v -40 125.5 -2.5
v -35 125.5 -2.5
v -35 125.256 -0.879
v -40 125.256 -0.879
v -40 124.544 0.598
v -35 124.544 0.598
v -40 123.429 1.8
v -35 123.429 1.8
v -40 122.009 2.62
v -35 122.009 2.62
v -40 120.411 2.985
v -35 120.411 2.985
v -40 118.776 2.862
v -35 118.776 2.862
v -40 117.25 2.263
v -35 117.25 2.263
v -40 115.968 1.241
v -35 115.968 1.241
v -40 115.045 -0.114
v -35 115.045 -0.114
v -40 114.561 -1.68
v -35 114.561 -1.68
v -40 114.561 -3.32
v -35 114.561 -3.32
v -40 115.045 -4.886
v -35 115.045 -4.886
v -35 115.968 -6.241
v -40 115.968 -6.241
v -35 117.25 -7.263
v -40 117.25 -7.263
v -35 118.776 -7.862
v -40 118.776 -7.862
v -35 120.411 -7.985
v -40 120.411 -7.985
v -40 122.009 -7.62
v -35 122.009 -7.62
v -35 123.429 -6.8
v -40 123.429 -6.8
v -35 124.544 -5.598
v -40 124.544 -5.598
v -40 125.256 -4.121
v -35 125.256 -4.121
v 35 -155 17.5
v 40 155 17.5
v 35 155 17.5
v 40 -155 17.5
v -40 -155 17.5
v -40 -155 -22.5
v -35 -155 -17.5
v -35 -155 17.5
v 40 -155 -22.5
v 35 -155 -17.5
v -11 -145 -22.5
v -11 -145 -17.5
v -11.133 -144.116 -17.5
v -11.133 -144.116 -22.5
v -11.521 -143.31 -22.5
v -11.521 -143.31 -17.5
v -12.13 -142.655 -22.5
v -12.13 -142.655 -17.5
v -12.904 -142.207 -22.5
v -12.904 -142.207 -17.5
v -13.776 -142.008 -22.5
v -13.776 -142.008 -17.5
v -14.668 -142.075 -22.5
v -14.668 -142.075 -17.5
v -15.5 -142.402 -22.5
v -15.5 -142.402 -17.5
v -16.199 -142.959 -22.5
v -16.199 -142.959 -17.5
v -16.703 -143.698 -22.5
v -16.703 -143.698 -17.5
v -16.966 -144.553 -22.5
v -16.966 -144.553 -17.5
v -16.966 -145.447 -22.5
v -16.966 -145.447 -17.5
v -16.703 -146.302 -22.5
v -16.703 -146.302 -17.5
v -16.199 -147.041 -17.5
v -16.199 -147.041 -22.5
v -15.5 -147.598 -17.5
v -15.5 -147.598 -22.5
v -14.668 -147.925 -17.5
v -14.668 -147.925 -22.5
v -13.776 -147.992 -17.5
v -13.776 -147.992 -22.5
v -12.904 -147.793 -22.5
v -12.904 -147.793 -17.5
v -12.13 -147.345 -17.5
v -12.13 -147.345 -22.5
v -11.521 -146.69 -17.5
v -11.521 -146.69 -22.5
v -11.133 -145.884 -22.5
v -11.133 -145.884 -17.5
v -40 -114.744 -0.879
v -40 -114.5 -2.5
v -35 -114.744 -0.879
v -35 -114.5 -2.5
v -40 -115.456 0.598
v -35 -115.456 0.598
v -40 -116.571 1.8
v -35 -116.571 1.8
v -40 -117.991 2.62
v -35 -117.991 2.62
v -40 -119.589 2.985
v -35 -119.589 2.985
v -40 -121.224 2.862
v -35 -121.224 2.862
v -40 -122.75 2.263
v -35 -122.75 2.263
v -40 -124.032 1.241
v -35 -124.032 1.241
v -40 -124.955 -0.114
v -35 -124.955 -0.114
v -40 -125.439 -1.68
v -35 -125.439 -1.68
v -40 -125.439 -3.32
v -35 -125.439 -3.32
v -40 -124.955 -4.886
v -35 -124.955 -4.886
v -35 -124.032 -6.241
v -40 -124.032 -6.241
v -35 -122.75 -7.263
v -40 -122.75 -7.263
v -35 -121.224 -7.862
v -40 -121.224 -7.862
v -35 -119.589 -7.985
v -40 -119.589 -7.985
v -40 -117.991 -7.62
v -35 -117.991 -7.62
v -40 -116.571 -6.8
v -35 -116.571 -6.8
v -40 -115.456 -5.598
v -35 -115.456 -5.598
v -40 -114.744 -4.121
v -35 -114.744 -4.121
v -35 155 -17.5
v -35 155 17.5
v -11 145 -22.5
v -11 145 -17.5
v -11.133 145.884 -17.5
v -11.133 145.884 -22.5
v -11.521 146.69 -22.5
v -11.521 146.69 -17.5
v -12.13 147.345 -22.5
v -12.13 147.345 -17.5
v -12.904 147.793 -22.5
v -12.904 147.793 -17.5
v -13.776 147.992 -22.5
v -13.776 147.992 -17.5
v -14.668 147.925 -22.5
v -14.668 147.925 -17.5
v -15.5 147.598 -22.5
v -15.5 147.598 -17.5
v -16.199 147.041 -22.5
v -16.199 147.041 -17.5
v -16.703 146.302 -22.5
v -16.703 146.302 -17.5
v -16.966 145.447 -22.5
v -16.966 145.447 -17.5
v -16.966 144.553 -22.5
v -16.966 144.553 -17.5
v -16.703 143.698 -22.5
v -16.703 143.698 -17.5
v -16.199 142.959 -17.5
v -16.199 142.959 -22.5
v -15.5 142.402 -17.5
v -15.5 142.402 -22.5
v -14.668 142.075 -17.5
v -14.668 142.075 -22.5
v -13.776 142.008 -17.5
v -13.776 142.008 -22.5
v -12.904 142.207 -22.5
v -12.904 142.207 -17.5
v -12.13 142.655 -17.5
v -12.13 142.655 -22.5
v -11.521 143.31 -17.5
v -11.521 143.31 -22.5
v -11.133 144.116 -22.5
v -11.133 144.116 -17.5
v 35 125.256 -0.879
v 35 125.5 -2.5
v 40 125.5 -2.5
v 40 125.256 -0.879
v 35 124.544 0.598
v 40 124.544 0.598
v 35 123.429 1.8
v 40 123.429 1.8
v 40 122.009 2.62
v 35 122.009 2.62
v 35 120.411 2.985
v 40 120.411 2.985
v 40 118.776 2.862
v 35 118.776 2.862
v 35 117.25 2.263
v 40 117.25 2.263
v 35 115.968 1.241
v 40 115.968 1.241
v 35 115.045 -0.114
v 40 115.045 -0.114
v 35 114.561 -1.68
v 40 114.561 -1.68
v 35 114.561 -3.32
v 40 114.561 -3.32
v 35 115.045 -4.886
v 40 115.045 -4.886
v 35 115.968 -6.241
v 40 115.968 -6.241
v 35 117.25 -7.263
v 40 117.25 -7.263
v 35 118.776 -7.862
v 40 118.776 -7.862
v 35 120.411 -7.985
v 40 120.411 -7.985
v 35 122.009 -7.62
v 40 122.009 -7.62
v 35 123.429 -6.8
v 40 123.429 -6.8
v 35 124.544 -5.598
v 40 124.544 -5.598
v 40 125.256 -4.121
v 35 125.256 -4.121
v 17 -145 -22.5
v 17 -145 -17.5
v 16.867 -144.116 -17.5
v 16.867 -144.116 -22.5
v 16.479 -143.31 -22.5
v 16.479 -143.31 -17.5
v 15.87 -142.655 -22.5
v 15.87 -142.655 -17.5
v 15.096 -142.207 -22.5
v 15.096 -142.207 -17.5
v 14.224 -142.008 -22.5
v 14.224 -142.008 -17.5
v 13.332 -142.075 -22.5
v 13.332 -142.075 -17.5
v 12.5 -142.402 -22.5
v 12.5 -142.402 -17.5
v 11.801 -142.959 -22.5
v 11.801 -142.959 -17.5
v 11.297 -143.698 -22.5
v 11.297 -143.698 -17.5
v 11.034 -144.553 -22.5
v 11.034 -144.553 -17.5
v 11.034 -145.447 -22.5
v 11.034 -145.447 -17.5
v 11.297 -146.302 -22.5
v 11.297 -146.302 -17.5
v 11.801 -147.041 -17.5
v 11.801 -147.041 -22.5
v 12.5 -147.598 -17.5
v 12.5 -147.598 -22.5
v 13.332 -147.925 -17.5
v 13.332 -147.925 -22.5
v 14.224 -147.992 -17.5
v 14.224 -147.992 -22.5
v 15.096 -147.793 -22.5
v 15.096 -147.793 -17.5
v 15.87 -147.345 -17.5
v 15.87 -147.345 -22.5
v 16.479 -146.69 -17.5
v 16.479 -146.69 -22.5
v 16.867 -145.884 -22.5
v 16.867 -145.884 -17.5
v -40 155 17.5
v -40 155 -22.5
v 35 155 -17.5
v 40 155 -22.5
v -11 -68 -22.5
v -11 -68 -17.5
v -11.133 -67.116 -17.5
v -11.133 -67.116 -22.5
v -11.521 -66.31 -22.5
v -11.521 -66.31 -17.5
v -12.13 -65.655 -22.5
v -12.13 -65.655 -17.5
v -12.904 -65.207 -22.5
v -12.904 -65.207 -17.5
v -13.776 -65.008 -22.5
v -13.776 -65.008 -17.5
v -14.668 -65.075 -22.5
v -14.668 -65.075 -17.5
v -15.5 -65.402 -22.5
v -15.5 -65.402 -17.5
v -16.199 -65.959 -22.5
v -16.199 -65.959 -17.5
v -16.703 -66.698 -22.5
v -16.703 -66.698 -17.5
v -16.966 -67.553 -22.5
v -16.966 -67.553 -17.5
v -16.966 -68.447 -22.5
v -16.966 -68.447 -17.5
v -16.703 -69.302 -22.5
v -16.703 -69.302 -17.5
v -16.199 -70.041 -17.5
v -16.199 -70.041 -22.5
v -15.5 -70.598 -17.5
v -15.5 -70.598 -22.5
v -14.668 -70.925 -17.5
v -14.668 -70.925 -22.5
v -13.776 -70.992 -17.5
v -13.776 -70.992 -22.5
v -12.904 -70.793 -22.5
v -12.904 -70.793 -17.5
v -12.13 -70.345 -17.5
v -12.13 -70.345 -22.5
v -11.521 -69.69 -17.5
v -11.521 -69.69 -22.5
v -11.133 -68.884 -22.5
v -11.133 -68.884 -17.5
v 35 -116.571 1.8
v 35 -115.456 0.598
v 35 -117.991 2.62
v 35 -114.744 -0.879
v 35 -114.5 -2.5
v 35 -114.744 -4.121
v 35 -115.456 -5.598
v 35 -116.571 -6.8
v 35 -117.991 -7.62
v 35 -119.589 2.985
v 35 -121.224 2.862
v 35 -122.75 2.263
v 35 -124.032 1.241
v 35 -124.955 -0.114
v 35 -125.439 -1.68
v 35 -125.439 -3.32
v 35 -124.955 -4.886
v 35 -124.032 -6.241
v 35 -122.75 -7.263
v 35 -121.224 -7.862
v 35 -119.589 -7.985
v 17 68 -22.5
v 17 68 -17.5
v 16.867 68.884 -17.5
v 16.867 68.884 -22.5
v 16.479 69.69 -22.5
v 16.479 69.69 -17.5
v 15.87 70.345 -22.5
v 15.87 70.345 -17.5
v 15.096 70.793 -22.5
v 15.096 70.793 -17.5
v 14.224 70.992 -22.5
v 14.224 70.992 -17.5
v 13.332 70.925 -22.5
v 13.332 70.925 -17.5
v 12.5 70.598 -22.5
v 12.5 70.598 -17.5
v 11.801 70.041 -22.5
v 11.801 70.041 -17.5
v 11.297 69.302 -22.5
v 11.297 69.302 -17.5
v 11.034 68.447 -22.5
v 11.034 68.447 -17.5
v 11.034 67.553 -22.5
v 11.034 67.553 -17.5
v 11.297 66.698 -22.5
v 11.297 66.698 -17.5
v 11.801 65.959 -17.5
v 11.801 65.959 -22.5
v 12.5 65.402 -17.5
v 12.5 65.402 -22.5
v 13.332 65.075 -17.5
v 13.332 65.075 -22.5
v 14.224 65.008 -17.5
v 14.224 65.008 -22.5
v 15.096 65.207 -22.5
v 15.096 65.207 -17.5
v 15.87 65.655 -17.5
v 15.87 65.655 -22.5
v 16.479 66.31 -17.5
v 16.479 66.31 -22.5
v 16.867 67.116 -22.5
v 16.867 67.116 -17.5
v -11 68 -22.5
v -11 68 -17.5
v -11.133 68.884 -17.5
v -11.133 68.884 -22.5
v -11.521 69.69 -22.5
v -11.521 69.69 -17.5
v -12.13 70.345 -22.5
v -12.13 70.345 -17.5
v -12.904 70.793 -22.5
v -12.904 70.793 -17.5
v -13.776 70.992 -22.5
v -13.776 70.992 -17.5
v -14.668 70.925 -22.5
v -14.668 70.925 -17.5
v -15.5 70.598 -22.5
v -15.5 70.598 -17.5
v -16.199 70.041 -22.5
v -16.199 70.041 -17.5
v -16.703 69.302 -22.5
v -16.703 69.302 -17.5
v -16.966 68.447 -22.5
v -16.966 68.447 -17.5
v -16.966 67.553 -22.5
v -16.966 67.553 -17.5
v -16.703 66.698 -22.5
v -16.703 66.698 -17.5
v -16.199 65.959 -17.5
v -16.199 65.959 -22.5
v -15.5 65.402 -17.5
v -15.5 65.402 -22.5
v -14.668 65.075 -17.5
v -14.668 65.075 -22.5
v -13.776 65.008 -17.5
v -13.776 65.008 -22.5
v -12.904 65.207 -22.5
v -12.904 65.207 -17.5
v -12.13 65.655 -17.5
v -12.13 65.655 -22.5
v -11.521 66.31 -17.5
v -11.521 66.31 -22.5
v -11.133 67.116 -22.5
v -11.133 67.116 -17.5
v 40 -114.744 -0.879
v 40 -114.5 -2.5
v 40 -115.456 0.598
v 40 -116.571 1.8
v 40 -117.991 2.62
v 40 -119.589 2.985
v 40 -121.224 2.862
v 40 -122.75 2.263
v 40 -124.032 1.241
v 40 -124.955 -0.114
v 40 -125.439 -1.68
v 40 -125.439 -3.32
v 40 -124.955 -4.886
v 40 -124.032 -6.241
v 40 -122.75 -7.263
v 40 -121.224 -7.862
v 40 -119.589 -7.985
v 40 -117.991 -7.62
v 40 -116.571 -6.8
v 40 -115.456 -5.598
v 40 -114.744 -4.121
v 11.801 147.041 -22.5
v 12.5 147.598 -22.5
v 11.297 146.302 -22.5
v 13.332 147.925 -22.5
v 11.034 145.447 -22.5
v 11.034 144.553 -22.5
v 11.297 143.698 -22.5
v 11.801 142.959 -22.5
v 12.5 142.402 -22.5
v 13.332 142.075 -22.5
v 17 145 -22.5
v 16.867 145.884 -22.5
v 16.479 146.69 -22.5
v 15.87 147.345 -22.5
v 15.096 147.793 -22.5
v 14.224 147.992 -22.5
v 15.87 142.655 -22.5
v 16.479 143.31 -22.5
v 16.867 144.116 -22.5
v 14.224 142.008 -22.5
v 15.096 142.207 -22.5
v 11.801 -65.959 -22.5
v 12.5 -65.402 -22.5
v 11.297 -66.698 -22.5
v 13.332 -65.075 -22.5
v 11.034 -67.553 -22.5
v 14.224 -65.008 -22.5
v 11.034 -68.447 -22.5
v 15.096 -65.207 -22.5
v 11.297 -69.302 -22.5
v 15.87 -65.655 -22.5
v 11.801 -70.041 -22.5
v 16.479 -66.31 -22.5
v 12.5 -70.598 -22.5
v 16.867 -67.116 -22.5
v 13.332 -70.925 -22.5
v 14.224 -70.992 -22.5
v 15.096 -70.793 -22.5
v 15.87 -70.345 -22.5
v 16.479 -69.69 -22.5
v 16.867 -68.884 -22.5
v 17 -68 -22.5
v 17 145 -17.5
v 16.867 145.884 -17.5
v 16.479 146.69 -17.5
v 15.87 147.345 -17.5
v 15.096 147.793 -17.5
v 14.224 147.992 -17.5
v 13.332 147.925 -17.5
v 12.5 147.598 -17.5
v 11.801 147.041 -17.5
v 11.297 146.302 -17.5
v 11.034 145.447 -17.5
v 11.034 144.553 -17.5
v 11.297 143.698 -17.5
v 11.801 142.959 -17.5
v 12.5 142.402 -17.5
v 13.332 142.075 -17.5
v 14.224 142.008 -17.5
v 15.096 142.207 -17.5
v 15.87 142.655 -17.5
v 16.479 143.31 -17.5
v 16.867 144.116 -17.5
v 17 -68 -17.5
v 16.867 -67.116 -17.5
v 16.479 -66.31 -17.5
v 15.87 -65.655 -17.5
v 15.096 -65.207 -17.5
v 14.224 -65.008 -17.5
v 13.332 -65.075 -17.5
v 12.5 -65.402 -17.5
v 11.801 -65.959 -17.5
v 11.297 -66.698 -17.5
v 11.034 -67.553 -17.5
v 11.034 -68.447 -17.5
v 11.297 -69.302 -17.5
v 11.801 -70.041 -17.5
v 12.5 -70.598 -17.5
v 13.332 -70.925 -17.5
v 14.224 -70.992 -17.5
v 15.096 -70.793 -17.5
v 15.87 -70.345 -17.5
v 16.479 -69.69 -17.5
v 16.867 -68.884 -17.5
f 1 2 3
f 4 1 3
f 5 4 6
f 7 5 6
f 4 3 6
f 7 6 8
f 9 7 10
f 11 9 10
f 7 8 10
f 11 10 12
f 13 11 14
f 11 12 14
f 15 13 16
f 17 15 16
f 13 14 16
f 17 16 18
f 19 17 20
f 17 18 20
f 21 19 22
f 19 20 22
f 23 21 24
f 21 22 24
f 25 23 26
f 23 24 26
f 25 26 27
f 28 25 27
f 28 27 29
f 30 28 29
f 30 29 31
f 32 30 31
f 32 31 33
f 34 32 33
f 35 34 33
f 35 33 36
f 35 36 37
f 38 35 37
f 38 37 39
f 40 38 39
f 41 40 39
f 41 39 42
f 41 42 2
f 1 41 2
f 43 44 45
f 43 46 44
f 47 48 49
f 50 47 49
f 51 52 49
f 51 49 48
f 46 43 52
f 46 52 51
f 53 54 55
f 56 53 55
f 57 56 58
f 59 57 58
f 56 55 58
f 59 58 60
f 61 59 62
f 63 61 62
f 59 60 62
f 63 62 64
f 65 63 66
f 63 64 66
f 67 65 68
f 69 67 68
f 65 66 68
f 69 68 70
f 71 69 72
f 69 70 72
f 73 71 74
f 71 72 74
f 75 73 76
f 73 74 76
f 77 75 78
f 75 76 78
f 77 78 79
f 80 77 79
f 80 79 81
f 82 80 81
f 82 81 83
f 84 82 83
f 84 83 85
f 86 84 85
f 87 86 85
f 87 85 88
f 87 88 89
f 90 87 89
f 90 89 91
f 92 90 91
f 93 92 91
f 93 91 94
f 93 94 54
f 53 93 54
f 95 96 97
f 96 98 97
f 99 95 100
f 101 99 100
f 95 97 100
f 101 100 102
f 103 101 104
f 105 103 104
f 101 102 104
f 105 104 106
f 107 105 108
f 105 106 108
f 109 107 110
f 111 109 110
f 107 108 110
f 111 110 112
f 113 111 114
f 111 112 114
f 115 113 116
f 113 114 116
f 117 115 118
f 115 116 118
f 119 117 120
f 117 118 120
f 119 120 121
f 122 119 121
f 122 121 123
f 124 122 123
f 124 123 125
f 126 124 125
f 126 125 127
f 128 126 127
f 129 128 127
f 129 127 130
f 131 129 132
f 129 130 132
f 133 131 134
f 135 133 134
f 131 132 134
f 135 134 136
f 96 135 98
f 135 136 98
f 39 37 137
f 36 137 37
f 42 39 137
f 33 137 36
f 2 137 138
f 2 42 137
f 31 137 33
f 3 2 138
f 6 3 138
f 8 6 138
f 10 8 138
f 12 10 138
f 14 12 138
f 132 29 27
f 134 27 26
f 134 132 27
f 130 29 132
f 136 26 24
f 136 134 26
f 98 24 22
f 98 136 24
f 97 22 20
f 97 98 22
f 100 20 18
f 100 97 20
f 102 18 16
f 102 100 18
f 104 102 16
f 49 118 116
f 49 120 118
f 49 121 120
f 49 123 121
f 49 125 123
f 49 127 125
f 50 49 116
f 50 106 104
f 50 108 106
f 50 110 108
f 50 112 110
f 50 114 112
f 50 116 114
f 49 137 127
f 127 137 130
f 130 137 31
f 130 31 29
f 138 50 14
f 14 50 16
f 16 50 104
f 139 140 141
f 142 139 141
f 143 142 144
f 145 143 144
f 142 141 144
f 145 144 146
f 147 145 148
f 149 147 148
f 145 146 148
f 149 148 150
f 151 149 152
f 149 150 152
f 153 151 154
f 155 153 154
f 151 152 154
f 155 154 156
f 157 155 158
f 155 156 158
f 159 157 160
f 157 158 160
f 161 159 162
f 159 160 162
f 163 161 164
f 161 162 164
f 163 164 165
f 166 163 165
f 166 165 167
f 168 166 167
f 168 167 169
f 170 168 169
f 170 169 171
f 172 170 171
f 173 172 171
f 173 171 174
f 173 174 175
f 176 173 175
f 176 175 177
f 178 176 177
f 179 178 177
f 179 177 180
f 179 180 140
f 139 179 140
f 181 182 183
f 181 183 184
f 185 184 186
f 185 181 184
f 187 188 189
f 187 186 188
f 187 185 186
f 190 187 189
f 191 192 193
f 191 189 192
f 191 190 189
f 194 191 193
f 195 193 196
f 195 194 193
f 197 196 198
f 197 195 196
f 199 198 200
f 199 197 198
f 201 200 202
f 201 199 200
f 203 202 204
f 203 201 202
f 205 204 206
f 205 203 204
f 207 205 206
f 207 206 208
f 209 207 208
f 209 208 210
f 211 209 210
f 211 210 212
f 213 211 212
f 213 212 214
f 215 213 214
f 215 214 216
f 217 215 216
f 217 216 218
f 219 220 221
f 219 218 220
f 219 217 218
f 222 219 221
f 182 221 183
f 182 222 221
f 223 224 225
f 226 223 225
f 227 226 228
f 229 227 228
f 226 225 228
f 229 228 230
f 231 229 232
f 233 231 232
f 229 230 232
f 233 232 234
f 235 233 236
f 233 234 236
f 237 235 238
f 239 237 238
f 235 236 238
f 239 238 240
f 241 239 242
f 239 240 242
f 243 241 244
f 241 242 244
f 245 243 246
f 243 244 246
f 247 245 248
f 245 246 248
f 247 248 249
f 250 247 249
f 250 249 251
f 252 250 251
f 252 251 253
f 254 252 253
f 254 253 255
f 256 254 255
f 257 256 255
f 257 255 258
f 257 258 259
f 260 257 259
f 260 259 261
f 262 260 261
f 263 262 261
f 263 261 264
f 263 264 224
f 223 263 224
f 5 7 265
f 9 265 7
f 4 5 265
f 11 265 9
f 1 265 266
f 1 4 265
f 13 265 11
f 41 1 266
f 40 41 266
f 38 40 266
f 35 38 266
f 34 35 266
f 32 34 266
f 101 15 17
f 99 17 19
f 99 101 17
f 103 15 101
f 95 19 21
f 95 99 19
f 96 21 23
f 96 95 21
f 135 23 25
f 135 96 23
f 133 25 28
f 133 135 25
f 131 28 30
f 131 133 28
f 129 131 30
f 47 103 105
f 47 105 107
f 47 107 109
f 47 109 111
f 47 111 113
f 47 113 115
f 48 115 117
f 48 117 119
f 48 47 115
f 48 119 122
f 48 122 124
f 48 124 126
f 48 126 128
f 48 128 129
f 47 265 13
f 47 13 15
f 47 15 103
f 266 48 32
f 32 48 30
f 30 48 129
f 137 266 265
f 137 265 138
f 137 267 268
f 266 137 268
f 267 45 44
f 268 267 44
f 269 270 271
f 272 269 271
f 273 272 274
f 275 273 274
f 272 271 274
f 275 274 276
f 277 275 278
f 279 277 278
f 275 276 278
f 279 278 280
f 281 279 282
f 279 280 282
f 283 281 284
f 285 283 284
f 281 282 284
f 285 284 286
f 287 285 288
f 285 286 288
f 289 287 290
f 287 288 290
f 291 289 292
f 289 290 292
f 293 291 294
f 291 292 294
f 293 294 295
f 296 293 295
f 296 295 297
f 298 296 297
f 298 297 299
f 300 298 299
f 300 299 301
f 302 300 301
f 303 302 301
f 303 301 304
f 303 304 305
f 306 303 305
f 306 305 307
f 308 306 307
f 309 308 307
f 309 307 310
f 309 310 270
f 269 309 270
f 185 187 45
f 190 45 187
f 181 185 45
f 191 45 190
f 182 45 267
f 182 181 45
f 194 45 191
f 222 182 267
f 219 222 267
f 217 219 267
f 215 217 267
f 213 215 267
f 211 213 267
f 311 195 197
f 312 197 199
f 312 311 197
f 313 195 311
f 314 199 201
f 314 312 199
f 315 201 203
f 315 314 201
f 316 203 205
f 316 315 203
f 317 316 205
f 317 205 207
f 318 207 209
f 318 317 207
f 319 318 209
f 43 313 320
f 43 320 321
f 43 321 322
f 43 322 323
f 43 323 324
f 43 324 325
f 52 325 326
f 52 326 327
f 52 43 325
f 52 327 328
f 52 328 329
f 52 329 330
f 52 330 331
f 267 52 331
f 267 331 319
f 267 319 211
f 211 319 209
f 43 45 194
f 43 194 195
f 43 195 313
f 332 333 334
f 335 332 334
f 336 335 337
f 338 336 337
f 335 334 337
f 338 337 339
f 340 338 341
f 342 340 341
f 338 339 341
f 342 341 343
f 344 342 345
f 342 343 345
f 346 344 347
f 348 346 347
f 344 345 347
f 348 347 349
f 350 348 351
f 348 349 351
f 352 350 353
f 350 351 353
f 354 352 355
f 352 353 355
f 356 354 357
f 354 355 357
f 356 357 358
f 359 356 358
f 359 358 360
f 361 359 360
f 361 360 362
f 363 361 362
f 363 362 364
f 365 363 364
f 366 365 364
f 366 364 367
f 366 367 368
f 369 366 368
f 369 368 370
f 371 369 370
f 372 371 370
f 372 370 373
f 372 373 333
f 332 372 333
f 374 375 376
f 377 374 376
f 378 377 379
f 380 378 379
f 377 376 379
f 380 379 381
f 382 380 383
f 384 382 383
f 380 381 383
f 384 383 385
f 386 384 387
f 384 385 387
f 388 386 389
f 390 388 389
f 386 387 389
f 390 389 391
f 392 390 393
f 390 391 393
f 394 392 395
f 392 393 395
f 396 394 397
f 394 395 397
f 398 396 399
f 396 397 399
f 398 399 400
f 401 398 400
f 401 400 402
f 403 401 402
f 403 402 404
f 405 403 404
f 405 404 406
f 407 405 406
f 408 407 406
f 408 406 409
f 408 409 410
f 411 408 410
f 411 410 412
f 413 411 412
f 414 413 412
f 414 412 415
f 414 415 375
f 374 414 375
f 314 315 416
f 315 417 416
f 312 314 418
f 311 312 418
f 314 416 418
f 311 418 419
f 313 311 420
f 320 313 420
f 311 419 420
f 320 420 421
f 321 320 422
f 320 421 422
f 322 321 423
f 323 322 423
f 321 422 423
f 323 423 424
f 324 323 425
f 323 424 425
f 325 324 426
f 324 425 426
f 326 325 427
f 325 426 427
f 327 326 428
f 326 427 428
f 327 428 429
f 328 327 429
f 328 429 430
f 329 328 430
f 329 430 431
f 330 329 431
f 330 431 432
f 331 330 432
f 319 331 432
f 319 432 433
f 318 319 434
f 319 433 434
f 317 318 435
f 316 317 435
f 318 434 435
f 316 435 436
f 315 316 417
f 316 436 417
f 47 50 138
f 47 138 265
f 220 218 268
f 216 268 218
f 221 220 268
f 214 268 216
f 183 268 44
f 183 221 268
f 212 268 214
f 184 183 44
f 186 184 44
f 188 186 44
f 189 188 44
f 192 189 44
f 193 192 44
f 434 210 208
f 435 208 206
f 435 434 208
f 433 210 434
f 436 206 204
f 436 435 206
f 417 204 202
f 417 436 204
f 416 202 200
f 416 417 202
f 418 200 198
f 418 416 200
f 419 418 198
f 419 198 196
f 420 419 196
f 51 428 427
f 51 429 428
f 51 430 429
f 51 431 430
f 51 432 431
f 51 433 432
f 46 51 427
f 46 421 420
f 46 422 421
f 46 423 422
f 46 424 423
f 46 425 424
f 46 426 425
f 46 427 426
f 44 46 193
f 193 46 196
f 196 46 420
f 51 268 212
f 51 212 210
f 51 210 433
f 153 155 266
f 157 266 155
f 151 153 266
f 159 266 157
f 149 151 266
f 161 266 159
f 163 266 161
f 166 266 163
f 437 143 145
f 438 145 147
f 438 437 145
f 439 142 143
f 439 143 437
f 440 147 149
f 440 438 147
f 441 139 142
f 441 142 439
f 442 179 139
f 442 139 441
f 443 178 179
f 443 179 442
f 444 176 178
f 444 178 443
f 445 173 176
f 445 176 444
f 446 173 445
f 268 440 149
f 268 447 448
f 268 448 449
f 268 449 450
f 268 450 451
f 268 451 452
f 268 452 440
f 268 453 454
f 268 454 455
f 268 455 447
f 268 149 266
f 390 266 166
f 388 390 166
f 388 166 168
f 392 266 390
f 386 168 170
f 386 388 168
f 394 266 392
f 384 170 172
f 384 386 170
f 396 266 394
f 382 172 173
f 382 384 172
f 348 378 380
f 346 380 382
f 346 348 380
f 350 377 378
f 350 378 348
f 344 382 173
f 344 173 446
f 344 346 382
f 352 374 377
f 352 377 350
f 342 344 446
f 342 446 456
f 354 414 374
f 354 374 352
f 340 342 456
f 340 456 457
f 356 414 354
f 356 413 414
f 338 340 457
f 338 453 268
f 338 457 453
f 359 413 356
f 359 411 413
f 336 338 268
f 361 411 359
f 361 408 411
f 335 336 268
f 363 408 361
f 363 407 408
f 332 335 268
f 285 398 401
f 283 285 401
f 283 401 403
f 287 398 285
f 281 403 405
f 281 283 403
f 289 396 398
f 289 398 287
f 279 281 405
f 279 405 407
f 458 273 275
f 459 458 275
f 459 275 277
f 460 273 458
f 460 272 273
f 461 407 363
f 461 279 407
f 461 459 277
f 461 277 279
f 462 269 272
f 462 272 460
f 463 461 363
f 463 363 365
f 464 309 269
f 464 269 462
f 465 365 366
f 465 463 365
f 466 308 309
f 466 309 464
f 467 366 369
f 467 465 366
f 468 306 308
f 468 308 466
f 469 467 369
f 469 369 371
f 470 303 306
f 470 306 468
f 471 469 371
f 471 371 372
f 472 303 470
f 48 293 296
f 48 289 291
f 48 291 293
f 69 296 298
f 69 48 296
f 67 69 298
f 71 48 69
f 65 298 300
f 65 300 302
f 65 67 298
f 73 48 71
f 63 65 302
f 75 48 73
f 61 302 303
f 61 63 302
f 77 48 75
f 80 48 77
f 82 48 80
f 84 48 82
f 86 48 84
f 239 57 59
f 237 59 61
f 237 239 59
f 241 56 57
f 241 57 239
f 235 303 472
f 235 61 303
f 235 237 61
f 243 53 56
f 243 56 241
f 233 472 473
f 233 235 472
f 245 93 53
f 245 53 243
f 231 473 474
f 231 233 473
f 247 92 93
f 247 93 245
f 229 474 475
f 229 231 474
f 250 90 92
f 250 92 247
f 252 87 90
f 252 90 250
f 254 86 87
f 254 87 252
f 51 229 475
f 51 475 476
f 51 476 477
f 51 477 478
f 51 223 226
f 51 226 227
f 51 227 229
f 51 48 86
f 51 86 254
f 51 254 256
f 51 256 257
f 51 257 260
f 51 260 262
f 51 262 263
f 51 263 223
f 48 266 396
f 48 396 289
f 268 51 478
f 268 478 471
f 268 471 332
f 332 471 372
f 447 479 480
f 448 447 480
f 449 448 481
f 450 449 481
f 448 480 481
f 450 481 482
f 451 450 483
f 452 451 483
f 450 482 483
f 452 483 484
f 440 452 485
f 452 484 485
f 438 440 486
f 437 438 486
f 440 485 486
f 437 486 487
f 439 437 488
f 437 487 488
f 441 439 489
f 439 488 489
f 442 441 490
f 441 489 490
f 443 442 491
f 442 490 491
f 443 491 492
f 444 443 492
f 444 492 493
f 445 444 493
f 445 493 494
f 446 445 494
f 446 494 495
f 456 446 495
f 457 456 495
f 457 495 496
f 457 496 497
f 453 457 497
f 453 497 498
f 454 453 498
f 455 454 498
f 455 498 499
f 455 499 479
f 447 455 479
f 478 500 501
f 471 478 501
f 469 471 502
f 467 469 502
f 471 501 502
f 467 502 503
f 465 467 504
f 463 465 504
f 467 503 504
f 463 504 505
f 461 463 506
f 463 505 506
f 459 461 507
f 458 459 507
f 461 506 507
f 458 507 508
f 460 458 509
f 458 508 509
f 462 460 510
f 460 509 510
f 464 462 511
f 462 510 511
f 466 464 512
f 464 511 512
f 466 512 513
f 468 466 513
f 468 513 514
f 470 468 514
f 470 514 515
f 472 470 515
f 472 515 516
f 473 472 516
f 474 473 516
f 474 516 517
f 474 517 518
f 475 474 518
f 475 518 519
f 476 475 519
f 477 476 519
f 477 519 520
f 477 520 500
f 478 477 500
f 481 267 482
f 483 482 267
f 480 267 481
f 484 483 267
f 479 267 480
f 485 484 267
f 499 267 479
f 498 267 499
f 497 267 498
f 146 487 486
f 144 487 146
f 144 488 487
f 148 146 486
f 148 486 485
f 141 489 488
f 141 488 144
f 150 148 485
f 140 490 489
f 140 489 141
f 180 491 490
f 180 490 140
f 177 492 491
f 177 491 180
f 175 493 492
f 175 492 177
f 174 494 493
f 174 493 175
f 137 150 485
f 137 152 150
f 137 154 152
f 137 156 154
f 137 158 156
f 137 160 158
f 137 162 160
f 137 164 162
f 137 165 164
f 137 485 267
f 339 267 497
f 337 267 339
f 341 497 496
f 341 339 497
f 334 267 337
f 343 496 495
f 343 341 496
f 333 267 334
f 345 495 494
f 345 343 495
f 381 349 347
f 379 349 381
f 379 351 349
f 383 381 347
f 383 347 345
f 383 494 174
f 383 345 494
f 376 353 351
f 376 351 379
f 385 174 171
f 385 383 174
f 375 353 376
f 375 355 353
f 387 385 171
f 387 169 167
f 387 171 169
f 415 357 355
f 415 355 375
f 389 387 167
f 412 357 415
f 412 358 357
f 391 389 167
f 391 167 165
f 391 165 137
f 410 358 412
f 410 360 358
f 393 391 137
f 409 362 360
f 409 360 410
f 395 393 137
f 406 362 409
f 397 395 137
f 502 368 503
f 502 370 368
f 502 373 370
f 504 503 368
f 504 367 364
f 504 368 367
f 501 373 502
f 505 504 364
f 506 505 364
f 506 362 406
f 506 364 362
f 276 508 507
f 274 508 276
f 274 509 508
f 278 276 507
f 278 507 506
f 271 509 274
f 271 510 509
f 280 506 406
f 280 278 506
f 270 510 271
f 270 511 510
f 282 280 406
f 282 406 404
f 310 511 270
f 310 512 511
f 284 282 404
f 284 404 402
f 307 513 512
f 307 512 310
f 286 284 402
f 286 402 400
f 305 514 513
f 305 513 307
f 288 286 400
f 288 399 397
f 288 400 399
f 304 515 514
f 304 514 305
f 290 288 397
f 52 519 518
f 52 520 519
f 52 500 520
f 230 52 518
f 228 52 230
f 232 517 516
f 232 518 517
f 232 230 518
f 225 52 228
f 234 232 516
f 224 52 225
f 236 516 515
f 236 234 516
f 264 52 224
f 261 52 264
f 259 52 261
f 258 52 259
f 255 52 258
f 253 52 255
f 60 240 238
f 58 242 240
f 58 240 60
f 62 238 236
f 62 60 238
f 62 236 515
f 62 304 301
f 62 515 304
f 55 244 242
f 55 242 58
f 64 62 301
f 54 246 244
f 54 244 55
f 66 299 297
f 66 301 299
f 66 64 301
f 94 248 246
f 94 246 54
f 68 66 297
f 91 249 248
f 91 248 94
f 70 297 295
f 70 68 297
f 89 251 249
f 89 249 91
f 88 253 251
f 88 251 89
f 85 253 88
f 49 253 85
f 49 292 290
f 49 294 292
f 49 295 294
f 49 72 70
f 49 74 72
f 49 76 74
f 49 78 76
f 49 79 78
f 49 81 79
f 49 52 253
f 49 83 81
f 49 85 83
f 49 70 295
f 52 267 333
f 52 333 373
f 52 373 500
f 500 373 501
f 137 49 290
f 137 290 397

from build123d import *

# Parameters (mm, degrees)
F1_DEPTH = 155
F2_R     = 5.5
F3_DEPTH = 50
F4_R     = 3
F5_DEPTH = 25


with BuildPart() as f1:
    # F0 (on Front) → F1 (new body, symmetric)
    with BuildSketch(Plane.XZ):
        Polygon((35, 17.5), (35, -17.5), (-35, -17.5), (-35, 17.5), (-40, 17.5), (-40, -22.5), (40, -22.5), (40, 17.5), align=None)
    extrude(amount=F1_DEPTH, both=True)

    # F2 (on Right) → F3 (cut, symmetric)
    with BuildSketch(Plane.YZ):
        with Locations((120, -2.5)):
            Circle(F2_R)
        with Locations((-120, -2.5)):
            Circle(F2_R)
    extrude(amount=F3_DEPTH, both=True, mode=Mode.SUBTRACT)

    # F4 (on face) → F5 (cut)
    with BuildSketch(Plane.XY.offset(-17.5)):
        with Locations((-14, 145)):
            Circle(F4_R)
        with Locations((14, 145)):
            Circle(F4_R)
        with Locations((-14, 68)):
            Circle(F4_R)
        with Locations((14, 68)):
            Circle(F4_R)
        with Locations((-14, -68)):
            Circle(F4_R)
        with Locations((14, -68)):
            Circle(F4_R)
        with Locations((-14, -145)):
            Circle(F4_R)
        with Locations((14, -145)):
            Circle(F4_R)
    extrude(amount=-F5_DEPTH, mode=Mode.SUBTRACT)


solid = f1.part
